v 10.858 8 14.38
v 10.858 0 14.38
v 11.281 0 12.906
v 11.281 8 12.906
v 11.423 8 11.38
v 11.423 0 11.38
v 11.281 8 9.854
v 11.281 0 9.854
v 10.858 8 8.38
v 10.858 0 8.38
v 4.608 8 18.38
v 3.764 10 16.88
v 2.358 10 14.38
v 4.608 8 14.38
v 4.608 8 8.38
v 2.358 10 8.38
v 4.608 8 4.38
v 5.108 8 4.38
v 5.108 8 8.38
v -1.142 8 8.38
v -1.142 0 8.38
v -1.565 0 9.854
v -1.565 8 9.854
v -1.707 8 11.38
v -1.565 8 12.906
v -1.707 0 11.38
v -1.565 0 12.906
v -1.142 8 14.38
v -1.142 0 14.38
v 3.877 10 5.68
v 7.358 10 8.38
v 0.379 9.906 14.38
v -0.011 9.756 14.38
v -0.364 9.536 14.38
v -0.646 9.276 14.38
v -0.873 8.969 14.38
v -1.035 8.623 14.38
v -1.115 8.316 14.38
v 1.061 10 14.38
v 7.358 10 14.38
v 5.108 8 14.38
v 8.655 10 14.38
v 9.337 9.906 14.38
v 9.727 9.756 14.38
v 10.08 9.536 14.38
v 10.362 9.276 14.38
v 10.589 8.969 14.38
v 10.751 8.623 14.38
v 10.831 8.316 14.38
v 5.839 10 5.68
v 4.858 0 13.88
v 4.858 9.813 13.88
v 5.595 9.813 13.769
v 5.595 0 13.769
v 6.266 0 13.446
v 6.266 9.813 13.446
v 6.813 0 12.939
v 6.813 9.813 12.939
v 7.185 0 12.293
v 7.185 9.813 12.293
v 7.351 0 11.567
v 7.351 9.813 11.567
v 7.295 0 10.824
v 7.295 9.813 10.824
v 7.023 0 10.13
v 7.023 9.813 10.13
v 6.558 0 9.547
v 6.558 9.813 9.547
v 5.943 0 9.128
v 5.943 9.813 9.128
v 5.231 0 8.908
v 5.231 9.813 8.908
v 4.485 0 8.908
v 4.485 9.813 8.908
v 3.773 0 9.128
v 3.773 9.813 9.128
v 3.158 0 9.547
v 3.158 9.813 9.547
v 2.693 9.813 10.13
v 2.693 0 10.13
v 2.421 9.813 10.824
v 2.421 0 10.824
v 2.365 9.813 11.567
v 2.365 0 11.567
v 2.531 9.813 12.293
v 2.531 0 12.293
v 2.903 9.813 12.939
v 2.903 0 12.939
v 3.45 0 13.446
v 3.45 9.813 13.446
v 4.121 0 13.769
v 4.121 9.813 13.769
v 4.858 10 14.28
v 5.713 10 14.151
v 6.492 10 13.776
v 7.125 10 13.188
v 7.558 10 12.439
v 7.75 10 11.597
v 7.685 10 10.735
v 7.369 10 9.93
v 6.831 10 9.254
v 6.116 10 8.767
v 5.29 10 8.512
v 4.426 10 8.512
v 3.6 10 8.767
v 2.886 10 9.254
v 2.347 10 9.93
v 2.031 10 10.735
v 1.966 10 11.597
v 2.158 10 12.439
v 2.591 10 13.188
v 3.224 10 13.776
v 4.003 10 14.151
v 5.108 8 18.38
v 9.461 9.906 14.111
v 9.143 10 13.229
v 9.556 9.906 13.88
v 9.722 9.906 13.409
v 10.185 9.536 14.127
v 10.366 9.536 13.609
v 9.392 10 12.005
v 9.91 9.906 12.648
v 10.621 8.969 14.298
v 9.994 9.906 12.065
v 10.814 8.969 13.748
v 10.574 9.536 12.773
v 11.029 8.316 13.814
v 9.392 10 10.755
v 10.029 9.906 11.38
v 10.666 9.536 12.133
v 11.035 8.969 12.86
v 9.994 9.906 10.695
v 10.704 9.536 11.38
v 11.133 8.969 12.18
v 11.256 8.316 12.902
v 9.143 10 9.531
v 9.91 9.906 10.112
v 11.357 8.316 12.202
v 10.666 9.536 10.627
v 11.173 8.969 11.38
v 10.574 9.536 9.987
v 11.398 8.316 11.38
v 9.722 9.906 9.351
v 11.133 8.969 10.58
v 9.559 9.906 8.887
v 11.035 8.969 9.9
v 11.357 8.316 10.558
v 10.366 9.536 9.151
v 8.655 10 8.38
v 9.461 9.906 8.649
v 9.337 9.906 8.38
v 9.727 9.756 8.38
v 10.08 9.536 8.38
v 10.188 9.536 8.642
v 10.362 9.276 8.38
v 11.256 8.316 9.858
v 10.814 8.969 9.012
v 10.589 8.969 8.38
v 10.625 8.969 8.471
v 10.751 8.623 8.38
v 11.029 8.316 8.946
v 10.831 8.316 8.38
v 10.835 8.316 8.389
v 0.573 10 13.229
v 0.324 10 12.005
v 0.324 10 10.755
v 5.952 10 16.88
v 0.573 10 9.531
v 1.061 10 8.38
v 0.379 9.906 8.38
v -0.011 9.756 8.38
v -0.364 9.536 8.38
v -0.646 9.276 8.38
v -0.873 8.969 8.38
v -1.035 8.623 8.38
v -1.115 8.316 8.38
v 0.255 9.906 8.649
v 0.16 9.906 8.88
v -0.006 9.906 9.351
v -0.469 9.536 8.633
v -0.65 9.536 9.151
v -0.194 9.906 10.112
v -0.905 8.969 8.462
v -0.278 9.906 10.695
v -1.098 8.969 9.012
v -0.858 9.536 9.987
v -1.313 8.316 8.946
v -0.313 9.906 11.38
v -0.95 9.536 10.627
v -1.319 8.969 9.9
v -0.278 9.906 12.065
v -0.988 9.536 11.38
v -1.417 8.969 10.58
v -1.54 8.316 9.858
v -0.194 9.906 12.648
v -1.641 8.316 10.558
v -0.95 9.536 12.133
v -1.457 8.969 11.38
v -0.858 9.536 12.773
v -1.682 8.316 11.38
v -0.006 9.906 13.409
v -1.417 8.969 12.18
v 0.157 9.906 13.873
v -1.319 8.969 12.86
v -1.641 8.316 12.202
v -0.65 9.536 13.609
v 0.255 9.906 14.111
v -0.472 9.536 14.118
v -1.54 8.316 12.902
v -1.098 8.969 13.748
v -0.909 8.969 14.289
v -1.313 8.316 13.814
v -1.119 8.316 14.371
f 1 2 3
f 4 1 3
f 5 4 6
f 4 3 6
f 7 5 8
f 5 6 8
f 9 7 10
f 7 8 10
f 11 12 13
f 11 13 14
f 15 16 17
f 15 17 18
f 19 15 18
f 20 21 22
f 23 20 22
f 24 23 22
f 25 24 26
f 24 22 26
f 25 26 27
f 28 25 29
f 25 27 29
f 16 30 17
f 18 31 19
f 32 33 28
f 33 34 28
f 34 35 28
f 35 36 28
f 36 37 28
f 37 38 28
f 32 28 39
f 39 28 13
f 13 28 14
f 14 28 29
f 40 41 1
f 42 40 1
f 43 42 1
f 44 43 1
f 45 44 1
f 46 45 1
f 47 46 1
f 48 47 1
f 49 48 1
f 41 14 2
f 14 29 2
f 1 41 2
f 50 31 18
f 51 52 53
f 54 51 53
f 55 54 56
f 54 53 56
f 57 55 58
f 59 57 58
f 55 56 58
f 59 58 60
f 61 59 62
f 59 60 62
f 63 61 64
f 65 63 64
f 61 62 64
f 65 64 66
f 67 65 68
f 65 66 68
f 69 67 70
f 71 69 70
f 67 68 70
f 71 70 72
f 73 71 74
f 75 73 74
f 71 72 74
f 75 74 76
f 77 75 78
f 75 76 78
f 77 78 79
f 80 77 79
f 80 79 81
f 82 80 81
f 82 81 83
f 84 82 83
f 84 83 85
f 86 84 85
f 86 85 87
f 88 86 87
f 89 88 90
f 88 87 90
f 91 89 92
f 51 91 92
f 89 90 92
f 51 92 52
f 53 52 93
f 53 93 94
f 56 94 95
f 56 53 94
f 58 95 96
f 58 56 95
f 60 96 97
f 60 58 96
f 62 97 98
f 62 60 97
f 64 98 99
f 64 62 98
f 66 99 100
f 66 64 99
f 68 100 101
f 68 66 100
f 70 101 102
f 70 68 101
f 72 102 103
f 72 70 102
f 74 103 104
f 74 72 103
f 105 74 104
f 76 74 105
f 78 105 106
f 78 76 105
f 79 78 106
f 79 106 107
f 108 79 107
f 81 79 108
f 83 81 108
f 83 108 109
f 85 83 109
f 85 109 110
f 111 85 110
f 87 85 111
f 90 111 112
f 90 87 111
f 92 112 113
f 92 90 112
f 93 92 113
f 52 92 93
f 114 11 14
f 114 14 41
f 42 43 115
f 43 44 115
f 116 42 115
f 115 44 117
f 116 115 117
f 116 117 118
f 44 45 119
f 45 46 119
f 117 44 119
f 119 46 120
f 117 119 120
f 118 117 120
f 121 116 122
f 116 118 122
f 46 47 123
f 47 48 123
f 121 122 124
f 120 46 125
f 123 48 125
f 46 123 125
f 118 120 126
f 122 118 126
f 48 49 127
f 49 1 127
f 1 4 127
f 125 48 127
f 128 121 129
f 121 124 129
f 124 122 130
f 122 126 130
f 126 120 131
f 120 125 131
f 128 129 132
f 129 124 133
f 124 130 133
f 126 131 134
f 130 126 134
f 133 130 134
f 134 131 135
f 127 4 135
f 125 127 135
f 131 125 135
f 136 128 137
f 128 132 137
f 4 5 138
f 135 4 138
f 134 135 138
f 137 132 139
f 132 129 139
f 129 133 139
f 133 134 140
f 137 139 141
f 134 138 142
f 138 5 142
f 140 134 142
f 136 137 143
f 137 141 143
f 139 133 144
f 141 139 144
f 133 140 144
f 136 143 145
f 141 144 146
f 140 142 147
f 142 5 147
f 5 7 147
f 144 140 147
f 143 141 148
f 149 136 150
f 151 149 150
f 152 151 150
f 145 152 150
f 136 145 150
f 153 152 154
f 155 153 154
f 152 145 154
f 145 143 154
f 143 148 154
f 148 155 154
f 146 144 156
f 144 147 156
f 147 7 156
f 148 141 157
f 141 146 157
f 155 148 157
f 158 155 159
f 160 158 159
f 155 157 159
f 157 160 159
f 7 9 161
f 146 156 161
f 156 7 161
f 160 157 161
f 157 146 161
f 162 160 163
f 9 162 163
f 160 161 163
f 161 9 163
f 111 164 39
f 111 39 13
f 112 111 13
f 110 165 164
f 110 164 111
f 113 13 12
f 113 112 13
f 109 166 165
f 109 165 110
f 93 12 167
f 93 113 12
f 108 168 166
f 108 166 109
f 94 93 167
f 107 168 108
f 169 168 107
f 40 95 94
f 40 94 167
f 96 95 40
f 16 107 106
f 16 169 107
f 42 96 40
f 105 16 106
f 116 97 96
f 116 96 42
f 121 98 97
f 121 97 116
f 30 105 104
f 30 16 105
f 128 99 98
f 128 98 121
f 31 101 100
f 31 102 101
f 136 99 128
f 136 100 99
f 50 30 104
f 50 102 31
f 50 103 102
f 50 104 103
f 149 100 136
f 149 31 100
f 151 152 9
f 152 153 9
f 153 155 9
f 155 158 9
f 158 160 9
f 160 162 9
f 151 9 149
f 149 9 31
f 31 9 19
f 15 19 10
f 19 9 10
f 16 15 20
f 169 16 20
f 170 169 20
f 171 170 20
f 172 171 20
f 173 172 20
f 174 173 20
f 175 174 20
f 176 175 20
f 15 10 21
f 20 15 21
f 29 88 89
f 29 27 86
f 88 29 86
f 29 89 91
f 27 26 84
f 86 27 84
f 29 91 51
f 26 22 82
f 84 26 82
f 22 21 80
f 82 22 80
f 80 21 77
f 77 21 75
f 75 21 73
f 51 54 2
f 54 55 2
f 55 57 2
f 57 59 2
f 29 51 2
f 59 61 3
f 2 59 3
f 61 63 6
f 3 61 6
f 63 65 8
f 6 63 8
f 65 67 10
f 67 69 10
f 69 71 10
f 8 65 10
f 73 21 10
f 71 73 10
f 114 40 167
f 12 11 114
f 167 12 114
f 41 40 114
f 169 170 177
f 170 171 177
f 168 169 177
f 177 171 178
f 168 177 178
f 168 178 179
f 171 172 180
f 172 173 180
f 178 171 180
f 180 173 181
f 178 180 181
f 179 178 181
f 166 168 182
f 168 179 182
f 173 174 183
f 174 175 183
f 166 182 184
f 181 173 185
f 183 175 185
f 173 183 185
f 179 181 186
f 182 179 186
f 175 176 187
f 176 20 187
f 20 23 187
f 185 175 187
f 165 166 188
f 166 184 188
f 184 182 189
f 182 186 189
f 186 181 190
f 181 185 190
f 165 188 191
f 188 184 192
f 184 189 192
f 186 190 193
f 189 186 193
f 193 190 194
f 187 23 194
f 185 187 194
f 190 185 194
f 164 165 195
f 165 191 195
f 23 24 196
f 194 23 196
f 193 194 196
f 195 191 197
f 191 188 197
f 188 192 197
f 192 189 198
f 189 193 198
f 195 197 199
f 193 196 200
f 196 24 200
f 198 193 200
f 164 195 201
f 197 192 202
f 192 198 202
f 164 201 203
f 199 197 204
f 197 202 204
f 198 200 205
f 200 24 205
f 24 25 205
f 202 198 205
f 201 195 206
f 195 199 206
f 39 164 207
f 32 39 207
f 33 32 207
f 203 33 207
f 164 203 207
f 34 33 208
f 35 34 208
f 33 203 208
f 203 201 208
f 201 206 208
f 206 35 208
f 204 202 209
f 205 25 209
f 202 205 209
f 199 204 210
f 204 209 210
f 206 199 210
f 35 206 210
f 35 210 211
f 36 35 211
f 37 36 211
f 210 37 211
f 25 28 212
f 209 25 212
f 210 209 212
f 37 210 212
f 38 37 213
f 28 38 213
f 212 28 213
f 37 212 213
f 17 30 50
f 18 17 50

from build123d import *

# Parameters (mm, degrees)
SALIENTE_EXTRUIR1_DEPTH   = 10
CROQUIS2_R                = 2.5
CORTAR_EXTRUIR1_DEPTH     = 10
CHAFL_N1_SIZE             = 0.4
CHAFL_N1_SIZE2            = 0.186523063
SALIENTE_EXTRUIR2_DEPTH   = 2
CORTAR_EXTRUIR2_START     = 0.687515582
CORTAR_EXTRUIR2_OUTLINE_W = 5
CORTAR_EXTRUIR2_OUTLINE_H = 5
CORTAR_EXTRUIR2_DEPTH     = 2.312484418
CORTAR_EXTRUIR4_DEPTH     = 9.799366623
CORTAR_EXTRUIR5_DEPTH     = 4
CORTAR_EXTRUIR6_START     = 19.504007809
CORTAR_EXTRUIR6_OUTLINE_W = 5
CORTAR_EXTRUIR6_OUTLINE_H = 5
CORTAR_EXTRUIR6_DEPTH     = 1.2
REDONDEO1_R               = 2


with BuildPart() as part:
    # Croquis1 → Saliente-Extruir1 (new body)
    with BuildSketch(Plane(origin=(0, 0, 0), x_dir=(1, 0, 0), z_dir=(0, 1, 0))):
        with BuildLine():
            Line((4.858013613, -14.380009761), (4.858013613, -8.380009761))
            Line((4.858013613, -8.380009761), (-1.141986387, -8.380009761))
            ThreePointArc((-1.141986387, -8.380009761), (-1.707193124, -11.380009761), (-1.141986387, -14.380009761))
            Line((-1.141986387, -14.380009761), (4.858013613, -14.380009761))
        make_face()
        with BuildLine():
            Line((10.858013613, -8.380009761), (4.858013613, -8.380009761))
            Line((4.858013613, -8.380009761), (4.858013613, -14.380009761))
            Line((4.858013613, -14.380009761), (10.858013613, -14.380009761))
            ThreePointArc((10.858013613, -14.380009761), (11.423220351, -11.380009761), (10.858013613, -8.380009761))
        make_face()
    extrude(amount=SALIENTE_EXTRUIR1_DEPTH)

    # Croquis2 → Cortar-Extruir1 (cut)
    with BuildSketch(Plane(origin=(0, 10, 0), x_dir=(1, 0, 0), z_dir=(0, 1, 0))):
        with Locations(Location((4.858013613, -11.380009761, 0), (0, 0, 270))):
            Circle(CROQUIS2_R)
    extrude(amount=-CORTAR_EXTRUIR1_DEPTH, mode=Mode.SUBTRACT)

    # Chaflán1
    chafl_n1_edges = [part.edges().sort_by_distance(p)[0] for p in [
        (4.858013613, 10, 8.880009761),
    ]]
    chafl_n1_side = [part.faces().sort_by_distance(p)[0] for p in [
        (4.858013613, 10, 8.524373107),
    ]]
    chamfer(chafl_n1_edges, length=CHAFL_N1_SIZE, length2=CHAFL_N1_SIZE2, reference=chafl_n1_side[0])

    # Croquis3 → Saliente-Extruir2 (add)
    with BuildSketch(Plane(origin=(0, 10, 0), x_dir=(1, 0, 0), z_dir=(0, 1, 0))):
        Polygon((2.358013613, -8.380009761), (4.858013613, -8.380009761), (4.858013613, -4.380009761), (4.608013613, -4.380009761), align=None)
        Polygon((4.858013613, -4.380009761), (4.858013613, -8.380009761), (7.358013613, -8.380009761), (5.108013613, -4.380009761), align=None)
    saliente_extruir2 = extrude(amount=-SALIENTE_EXTRUIR2_DEPTH)

    # Cortar-Extruir2: read off the stored shape, not the designer's step
    # Cortar-Extruir2 outline → Cortar-Extruir2 (cut)
    with BuildSketch(Plane(origin=(0, 0, 0), x_dir=(1, 0, 0), z_dir=(0, 0.5449883505954141, -0.8384436163006372)).offset(CORTAR_EXTRUIR2_START)):
        with Locations((4.5, -10.5)):
            Rectangle(CORTAR_EXTRUIR2_OUTLINE_W, CORTAR_EXTRUIR2_OUTLINE_H)
    extrude(amount=CORTAR_EXTRUIR2_DEPTH, mode=Mode.SUBTRACT)

    # Cortar-Extruir4: read off the stored shape, not the designer's step
    # Cortar-Extruir4 outline → Cortar-Extruir4 (cut)
    with BuildSketch(Plane(origin=(-1.717842267, 1.932572551, 0), x_dir=(-0.7474093186836599, -0.6643638388299198, 0), z_dir=(0.6643638388299198, -0.7474093186836599, 0))):
        Polygon((-9.132687685, -4.380009761), (-12.14308633, -8.380009761), (-9.132687685, -8.380009761), align=None)
    cortar_extruir4 = extrude(amount=CORTAR_EXTRUIR4_DEPTH, mode=Mode.SUBTRACT)

    # Croquis13 → Cortar-Extruir5 (cut, along a direction that is not the sketch's normal)
    with BuildSketch(Plane(origin=(6.006295664, 6.757082622, 0), x_dir=(0.7474093186836596, -0.66436383882992, 0), z_dir=(0.66436383882992, 0.7474093186836596, 0))):
        Polygon((-1.870838395, -8.380009761), (-1.870838395, -4.380009761), (-4.88123704, -8.380009761), align=None)
    cortar_extruir5 = extrude(amount=-CORTAR_EXTRUIR5_DEPTH, dir=(0, 1, 0), mode=Mode.SUBTRACT)

    # Simetría1: Saliente-Extruir2 across plane
    add(saliente_extruir2.mirror(Plane(origin=(0, 0, 11.380009761), x_dir=(1, 0, 0), z_dir=(0, 0, -1))))

    # Simetría3: Cortar-Extruir4, Cortar-Extruir5 across plane
    add(cortar_extruir4.mirror(Plane(origin=(0, 0, 11.380009761), x_dir=(1, 0, 0), z_dir=(0, 0, -1))), mode=Mode.SUBTRACT)
    add(cortar_extruir5.mirror(Plane(origin=(0, 0, 11.380009761), x_dir=(1, 0, 0), z_dir=(0, 0, -1))), mode=Mode.SUBTRACT)

    # Cortar-Extruir6: read off the stored shape, not the designer's step
    # Cortar-Extruir6 outline → Cortar-Extruir6 (cut)
    with BuildSketch(Plane(origin=(0, 0, 0), x_dir=(1, 0, 0), z_dir=(0, 0.5999999999999971, 0.8000000000000023)).offset(CORTAR_EXTRUIR6_START)):
        with Locations((4.5, -3.5)):
            Rectangle(CORTAR_EXTRUIR6_OUTLINE_W, CORTAR_EXTRUIR6_OUTLINE_H)
    extrude(amount=CORTAR_EXTRUIR6_DEPTH, mode=Mode.SUBTRACT)

    # Redondeo1
    redondeo1_edges = [part.edges().sort_by_distance(p)[0] for p in [
        (-1.707193124, 10, 11.380009761),
        (11.423220351, 10, 11.380009761),
    ]]
    fillet(redondeo1_edges, radius=REDONDEO1_R)


solid = part.part
